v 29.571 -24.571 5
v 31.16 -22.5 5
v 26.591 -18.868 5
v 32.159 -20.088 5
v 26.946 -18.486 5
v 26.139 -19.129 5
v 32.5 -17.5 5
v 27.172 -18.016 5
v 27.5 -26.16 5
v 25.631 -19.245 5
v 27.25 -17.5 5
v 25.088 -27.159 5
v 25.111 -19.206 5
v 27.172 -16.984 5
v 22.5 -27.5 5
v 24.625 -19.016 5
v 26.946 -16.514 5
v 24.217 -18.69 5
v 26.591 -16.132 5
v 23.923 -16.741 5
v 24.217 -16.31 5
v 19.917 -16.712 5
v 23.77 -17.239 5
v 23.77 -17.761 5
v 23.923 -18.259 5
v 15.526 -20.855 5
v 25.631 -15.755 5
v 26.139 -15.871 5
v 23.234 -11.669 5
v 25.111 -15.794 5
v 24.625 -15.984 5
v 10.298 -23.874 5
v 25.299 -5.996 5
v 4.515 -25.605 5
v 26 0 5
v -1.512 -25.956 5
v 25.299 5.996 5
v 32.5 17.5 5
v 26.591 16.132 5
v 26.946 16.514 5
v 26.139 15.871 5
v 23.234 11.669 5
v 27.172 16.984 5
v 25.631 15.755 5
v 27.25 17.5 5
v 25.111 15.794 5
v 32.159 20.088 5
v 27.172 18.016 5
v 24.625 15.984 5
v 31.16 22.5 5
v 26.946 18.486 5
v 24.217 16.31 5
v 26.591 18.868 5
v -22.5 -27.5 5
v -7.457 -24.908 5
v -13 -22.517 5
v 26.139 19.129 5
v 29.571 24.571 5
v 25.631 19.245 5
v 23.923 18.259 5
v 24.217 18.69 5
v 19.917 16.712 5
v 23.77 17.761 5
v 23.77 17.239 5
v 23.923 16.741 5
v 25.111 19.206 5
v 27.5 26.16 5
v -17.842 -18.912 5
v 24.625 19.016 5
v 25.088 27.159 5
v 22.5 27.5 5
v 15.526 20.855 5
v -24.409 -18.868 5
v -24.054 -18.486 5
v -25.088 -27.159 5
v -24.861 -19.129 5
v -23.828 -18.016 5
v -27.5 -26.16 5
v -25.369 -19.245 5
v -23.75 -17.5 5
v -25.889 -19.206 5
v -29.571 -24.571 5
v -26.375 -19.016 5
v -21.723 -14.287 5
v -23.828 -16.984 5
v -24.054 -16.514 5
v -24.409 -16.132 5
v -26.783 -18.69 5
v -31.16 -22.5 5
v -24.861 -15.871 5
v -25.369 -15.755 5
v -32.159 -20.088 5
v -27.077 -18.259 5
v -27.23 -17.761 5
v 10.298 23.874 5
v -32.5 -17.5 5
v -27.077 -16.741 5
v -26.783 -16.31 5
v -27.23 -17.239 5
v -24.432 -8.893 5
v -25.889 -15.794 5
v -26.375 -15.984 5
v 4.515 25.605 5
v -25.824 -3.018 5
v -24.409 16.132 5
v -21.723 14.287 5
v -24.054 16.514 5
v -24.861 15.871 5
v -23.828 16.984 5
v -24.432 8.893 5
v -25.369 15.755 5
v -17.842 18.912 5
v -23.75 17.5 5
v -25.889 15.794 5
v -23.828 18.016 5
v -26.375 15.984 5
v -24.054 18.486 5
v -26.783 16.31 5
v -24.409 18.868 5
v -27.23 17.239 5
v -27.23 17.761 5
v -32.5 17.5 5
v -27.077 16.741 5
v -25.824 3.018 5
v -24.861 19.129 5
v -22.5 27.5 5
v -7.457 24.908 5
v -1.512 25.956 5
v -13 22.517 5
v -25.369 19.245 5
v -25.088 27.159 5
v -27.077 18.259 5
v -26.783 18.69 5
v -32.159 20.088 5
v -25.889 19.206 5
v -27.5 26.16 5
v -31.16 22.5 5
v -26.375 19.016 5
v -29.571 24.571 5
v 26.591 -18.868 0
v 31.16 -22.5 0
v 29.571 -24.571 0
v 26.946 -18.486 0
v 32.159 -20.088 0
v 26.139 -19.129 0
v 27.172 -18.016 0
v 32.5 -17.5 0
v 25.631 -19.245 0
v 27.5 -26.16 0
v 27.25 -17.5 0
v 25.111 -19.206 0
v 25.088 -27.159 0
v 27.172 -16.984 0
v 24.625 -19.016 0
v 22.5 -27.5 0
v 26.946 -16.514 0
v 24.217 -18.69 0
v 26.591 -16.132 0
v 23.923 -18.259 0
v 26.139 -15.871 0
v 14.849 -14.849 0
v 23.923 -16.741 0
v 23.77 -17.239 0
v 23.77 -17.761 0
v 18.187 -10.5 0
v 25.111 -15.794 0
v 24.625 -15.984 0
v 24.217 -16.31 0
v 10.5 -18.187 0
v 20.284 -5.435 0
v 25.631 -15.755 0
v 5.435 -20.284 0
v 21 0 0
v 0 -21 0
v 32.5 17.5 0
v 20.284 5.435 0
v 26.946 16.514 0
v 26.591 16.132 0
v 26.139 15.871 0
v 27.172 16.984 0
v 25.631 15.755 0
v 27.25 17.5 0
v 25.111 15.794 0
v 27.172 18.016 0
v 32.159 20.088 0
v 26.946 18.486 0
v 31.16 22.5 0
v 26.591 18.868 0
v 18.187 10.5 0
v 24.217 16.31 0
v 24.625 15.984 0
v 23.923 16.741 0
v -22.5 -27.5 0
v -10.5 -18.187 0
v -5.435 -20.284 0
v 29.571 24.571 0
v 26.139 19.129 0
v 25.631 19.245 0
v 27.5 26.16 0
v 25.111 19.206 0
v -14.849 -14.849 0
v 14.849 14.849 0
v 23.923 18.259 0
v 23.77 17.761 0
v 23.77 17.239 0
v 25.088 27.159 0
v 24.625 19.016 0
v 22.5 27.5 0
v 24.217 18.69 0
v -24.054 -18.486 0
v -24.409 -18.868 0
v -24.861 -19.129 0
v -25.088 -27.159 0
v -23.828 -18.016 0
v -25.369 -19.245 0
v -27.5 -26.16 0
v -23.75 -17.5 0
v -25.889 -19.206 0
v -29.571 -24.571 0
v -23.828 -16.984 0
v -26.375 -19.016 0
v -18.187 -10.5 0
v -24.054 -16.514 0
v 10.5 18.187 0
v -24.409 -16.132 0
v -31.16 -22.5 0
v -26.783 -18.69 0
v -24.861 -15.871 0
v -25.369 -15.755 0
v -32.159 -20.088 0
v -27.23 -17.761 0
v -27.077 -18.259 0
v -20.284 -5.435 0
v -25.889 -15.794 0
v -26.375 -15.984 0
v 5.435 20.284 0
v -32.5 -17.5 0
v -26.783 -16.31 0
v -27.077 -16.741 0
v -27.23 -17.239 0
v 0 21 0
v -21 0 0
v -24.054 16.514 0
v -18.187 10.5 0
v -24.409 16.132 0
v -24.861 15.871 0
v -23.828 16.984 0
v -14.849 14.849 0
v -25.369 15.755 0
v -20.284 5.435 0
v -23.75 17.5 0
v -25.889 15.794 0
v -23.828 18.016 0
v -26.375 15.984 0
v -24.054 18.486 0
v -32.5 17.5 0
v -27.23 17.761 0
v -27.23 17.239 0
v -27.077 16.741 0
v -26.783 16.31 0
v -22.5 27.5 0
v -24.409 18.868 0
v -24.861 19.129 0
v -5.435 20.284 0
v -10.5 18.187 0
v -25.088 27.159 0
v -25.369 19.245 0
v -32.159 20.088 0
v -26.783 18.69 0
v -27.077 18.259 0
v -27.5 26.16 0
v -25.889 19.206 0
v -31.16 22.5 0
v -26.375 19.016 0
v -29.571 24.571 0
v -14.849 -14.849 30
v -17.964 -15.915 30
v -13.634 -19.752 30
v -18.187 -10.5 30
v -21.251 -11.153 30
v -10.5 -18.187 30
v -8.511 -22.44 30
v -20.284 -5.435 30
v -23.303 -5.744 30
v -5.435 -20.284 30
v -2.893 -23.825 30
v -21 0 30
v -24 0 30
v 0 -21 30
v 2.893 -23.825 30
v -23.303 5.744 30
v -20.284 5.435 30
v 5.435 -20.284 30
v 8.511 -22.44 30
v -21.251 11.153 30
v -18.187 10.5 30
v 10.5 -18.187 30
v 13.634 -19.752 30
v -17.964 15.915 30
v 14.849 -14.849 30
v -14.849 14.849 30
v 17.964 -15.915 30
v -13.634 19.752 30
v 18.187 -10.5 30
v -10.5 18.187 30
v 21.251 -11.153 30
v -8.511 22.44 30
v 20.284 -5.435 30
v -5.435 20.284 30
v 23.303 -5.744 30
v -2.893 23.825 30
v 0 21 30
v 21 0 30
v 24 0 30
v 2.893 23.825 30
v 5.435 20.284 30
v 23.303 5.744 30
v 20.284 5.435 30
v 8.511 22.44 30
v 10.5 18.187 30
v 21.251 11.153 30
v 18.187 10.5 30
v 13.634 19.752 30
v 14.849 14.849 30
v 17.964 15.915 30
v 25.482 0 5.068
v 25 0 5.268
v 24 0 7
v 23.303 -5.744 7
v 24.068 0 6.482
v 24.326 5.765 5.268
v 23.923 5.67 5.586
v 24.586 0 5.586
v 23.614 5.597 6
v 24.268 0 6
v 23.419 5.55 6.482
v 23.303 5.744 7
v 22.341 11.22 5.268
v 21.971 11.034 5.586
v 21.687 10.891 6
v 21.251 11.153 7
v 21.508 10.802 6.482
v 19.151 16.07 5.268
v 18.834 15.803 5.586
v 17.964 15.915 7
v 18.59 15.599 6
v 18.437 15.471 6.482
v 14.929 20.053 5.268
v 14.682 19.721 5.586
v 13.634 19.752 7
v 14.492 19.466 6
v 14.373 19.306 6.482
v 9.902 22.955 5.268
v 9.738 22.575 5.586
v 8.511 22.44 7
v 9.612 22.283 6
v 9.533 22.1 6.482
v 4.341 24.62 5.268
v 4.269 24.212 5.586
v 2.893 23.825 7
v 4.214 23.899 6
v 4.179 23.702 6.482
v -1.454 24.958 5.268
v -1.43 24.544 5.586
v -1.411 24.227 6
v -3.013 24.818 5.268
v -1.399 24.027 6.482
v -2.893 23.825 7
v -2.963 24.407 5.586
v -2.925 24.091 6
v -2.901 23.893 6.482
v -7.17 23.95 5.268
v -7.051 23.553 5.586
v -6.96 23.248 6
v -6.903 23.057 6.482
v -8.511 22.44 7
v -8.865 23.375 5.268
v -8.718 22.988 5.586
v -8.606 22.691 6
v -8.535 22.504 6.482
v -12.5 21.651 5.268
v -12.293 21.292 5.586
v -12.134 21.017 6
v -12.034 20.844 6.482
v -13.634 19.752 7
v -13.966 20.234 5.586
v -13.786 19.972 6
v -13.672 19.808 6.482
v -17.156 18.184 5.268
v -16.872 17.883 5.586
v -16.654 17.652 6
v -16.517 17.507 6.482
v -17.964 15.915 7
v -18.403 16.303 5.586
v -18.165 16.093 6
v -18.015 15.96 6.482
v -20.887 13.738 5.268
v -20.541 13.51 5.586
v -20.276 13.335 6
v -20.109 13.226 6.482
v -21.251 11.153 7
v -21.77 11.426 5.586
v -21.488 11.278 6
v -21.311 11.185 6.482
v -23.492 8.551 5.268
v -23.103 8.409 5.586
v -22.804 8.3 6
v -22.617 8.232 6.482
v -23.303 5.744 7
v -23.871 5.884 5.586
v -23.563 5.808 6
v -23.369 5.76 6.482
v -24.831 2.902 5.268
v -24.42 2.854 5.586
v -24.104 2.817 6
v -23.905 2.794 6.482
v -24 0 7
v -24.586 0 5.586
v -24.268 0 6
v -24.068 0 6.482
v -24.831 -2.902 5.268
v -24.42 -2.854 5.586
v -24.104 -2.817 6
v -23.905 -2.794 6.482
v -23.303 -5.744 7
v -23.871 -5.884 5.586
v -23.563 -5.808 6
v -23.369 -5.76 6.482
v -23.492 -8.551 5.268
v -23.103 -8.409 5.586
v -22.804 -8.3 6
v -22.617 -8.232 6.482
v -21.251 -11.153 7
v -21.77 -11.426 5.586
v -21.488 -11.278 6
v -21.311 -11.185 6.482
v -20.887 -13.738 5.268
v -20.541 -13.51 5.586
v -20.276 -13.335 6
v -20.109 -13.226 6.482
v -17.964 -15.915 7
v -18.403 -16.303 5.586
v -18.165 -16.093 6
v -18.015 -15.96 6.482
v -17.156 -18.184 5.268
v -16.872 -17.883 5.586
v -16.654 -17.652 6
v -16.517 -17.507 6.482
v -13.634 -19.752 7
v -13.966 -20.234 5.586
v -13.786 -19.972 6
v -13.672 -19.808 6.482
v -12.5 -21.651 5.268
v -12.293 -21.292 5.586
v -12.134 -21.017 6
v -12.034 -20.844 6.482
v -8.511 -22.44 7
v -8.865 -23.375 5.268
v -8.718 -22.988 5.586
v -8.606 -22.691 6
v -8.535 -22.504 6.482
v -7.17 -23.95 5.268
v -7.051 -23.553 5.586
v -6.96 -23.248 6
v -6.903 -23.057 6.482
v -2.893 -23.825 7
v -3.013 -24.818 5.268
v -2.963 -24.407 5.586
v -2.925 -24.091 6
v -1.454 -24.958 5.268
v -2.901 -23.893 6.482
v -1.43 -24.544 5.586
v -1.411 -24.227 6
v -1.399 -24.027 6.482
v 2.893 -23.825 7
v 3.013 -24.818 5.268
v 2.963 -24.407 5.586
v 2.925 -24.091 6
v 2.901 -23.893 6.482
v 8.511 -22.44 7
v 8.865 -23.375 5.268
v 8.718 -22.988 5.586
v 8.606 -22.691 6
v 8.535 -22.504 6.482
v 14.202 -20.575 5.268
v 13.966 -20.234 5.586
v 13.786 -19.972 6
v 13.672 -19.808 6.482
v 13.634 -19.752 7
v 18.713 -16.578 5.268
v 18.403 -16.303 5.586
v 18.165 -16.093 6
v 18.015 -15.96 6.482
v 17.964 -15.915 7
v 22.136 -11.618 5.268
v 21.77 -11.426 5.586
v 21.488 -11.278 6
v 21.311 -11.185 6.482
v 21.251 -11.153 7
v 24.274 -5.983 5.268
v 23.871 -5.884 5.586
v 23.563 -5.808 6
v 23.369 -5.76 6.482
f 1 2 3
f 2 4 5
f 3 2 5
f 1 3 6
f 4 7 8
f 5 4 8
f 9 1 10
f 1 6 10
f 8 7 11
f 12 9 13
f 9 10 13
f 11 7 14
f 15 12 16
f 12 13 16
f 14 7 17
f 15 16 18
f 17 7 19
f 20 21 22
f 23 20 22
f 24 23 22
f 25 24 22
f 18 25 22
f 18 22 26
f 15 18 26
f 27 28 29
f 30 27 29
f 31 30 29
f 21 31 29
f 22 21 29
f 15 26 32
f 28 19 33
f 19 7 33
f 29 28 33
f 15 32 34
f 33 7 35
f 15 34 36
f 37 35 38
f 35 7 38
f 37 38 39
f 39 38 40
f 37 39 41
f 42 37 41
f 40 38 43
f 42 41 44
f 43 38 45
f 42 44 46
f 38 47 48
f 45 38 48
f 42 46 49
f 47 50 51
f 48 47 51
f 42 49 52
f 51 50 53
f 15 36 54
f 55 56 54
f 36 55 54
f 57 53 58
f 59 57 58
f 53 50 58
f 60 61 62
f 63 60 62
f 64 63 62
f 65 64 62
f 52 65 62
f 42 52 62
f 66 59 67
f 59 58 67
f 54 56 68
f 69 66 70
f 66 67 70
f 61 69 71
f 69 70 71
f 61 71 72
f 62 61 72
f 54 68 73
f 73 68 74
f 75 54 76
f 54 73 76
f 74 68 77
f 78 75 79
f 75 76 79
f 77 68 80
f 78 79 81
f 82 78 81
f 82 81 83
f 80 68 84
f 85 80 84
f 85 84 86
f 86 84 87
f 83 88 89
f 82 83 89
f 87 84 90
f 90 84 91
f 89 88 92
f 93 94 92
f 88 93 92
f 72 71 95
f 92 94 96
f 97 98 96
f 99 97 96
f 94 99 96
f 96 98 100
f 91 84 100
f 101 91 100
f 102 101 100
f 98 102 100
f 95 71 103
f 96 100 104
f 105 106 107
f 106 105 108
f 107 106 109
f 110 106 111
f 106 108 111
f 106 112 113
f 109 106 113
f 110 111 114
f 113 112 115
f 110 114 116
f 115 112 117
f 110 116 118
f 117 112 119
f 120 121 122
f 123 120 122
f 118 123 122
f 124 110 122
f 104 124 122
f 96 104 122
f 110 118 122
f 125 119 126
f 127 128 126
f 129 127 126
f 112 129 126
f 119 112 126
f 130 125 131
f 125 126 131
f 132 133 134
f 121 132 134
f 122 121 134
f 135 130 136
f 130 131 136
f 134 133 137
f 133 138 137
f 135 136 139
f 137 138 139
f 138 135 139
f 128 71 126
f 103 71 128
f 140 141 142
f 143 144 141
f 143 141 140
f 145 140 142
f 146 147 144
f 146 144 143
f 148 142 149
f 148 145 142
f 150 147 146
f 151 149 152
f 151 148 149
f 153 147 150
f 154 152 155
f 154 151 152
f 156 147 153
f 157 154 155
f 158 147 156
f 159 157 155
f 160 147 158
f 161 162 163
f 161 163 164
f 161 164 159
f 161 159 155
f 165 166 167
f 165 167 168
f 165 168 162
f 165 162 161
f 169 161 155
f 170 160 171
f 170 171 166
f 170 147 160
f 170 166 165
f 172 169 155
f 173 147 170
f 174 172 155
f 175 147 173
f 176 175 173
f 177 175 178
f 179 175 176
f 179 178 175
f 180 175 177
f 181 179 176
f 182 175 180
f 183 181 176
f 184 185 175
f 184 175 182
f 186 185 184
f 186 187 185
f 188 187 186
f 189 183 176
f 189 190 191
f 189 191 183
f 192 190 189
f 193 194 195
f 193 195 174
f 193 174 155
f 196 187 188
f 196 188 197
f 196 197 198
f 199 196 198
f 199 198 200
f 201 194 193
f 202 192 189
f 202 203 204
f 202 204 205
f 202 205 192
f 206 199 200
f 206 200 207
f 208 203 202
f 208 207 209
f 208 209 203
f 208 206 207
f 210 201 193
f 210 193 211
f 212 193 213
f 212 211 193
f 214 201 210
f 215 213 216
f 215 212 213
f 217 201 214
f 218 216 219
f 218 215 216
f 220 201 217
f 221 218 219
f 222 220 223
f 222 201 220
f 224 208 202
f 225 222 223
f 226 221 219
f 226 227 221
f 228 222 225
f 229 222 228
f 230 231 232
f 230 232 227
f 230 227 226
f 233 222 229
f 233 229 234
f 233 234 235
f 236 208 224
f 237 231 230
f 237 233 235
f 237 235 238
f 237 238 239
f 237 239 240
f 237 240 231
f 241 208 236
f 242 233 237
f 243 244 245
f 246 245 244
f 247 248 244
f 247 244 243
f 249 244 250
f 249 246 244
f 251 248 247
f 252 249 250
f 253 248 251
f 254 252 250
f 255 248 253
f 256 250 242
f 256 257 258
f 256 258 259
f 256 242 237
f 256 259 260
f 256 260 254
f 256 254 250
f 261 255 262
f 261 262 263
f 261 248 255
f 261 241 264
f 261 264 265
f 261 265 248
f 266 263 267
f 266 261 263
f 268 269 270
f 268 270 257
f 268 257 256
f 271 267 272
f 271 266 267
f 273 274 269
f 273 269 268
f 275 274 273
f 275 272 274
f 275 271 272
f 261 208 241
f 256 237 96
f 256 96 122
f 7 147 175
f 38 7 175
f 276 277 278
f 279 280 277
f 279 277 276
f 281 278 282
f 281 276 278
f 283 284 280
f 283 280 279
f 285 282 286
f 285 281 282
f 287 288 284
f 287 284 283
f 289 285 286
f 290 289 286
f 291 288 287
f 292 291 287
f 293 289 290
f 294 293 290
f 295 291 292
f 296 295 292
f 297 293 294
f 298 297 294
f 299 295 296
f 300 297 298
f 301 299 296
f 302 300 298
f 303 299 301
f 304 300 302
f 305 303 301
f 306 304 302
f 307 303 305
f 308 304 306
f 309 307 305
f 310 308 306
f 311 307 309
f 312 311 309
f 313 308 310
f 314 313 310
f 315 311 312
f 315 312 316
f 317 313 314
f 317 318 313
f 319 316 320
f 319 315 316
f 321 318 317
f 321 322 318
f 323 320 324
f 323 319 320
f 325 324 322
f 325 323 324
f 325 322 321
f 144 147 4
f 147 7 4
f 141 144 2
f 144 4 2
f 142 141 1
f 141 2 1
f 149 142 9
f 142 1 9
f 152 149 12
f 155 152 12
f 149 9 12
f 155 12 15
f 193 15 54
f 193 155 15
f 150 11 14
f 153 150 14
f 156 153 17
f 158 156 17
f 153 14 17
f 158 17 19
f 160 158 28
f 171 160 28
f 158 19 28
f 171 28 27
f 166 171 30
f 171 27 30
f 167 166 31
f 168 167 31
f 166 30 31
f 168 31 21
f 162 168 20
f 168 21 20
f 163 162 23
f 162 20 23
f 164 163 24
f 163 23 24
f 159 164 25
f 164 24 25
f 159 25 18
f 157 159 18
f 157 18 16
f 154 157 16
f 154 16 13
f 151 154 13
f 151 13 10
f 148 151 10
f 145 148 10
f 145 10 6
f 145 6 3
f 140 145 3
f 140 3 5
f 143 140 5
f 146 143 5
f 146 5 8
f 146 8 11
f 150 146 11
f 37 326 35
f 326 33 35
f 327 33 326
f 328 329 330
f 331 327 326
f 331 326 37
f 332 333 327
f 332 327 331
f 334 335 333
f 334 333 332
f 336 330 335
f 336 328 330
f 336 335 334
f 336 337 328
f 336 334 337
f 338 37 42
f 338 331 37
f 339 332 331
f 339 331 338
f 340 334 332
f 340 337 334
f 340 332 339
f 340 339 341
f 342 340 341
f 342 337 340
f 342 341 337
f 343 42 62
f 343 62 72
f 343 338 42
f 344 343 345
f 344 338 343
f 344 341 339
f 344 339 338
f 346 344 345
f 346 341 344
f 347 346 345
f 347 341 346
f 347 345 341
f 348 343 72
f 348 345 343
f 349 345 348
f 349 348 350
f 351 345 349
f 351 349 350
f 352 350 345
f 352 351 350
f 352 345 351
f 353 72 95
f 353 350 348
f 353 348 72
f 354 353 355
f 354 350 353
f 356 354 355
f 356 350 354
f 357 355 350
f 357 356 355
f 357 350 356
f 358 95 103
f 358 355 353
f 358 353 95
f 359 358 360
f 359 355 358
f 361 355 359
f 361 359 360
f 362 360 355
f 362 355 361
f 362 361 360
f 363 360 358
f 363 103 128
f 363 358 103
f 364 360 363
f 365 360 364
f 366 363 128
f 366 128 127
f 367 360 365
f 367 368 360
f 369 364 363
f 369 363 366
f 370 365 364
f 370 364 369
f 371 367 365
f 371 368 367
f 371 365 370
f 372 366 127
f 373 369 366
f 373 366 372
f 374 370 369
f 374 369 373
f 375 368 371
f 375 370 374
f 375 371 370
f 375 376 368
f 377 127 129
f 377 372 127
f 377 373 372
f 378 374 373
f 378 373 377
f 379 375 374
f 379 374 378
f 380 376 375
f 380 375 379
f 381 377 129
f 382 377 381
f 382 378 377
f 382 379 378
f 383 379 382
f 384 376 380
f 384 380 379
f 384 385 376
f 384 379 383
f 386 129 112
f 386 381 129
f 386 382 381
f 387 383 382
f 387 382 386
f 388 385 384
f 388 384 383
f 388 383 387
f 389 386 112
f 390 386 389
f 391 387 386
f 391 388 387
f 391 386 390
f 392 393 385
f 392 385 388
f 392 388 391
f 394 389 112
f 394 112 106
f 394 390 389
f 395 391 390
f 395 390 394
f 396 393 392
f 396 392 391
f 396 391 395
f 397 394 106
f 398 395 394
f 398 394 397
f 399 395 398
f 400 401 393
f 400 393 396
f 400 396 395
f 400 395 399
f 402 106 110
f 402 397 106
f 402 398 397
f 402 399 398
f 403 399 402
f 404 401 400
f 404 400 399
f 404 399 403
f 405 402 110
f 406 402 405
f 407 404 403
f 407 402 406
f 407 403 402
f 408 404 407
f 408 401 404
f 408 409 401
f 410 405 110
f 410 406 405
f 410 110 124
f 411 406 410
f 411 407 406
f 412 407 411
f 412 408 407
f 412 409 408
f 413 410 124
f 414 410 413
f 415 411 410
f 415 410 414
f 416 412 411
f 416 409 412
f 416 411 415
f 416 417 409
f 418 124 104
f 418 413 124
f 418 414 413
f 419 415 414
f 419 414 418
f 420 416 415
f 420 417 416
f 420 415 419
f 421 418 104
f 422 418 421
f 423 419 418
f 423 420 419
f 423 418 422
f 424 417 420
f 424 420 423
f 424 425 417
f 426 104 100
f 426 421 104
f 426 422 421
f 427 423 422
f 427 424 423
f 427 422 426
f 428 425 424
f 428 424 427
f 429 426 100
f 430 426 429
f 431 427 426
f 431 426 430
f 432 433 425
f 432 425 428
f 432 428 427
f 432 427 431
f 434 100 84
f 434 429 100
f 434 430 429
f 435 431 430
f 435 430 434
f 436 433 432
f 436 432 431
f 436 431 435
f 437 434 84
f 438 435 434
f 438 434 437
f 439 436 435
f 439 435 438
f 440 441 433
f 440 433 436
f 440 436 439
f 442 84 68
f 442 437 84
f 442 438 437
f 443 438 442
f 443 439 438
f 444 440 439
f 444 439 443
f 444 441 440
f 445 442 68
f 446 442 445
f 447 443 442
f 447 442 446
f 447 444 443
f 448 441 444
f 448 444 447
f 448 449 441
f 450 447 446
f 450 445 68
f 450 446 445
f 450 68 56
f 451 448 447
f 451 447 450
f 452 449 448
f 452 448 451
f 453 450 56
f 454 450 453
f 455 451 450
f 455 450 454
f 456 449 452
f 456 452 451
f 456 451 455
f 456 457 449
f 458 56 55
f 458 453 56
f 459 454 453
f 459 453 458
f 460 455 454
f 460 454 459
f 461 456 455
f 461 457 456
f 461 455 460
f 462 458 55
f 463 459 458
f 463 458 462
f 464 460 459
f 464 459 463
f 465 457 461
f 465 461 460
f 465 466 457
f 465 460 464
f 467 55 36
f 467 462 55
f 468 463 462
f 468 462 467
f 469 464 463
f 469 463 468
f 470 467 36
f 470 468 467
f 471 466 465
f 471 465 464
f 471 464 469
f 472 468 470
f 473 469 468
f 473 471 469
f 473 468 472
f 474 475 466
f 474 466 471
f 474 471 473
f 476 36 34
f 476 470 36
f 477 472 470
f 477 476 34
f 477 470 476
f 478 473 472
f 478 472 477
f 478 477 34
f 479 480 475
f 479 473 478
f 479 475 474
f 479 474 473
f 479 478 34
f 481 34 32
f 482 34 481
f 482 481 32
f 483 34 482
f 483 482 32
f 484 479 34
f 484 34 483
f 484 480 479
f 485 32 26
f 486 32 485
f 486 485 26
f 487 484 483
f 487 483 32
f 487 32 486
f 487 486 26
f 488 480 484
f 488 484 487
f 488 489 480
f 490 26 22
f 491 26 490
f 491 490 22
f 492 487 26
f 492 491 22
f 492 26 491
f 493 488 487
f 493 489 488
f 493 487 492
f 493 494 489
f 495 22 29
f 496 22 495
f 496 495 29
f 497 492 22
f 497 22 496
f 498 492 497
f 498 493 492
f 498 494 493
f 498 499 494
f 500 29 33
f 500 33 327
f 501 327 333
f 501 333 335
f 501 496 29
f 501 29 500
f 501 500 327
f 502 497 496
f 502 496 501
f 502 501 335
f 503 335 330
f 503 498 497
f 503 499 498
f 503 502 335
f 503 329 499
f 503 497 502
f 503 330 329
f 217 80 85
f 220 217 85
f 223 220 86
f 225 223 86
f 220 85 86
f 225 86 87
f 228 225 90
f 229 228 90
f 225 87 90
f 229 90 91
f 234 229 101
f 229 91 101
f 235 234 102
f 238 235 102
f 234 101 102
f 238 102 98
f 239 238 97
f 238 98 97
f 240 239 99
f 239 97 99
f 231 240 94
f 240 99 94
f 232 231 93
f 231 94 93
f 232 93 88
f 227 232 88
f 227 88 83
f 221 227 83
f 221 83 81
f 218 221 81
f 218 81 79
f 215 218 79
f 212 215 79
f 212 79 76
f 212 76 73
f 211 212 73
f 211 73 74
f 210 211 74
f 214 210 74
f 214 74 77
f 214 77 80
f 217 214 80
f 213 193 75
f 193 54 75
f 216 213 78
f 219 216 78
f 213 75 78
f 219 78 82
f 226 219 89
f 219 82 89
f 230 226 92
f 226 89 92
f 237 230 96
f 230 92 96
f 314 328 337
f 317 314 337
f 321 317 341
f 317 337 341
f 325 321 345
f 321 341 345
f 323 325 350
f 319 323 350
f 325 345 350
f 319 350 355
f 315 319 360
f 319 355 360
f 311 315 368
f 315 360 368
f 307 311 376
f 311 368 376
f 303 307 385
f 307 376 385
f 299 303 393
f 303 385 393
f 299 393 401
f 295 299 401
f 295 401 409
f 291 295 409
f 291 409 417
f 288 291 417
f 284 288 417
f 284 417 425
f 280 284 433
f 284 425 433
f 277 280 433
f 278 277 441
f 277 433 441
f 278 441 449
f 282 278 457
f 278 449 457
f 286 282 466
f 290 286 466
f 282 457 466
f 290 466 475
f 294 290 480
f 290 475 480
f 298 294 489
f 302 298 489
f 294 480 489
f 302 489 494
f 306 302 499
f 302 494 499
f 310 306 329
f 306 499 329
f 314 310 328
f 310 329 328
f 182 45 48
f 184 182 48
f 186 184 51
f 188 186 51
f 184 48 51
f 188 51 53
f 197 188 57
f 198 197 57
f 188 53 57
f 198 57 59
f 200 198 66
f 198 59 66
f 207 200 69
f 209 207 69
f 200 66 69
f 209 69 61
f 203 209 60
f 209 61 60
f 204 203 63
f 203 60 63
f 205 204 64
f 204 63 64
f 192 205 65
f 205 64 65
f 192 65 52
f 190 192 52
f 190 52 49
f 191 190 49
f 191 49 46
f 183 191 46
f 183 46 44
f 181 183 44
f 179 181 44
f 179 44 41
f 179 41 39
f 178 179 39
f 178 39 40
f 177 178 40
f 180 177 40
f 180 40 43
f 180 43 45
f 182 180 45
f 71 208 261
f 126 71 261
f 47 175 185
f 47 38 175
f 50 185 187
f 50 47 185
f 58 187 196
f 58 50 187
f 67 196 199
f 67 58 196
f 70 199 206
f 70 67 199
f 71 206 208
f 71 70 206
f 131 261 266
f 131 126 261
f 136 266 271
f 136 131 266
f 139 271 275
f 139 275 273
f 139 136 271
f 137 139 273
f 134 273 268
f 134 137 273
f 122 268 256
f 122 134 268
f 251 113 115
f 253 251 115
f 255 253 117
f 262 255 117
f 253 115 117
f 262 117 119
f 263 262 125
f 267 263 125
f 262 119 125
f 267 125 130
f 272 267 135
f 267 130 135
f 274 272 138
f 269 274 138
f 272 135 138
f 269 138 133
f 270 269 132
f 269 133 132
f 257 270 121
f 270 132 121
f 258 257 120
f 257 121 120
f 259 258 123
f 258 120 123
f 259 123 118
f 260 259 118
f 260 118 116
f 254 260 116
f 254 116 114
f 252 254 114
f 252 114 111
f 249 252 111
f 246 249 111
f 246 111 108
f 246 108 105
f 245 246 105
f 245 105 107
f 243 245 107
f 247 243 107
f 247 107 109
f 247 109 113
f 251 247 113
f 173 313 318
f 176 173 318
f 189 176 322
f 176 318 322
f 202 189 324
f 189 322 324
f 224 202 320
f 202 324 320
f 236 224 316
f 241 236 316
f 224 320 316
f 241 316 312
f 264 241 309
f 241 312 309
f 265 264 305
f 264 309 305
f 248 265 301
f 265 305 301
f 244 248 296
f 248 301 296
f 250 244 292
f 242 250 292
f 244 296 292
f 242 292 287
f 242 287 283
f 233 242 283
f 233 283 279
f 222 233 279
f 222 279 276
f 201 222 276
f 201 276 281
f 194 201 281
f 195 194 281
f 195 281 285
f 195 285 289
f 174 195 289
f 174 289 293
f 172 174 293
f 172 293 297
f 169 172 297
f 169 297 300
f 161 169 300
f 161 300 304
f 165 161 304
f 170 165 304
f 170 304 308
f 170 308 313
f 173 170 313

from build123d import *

# Parameters (mm, degrees)
SKETCH_1_R          = 27.5
EXTRUDE_1_DEPTH     = 5
SKETCH_2_R          = 24
EXTRUDE_2_DEPTH     = 25
SKETCH_4_W          = 65
SKETCH_4_H          = 55
EXTRUDE_3_DEPTH     = 5
SKETCH_5_R          = 21
CUT_EXTRUDE_1_DEPTH = 59
FILLET_1_R          = 10
SKETCH_6_R          = 1.75
CUT_EXTRUDE_2_DEPTH = 10
FILLET_2_R          = 2


with BuildPart() as part:
    # 草图1 → 凸台-拉伸1 (new body)
    with BuildSketch(Plane.XY):
        Circle(SKETCH_1_R)
    extrude(amount=EXTRUDE_1_DEPTH)

    # 草图2 → 凸台-拉伸2 (add)
    with BuildSketch(Plane.XY.offset(5)):
        Circle(SKETCH_2_R)
    extrude(amount=EXTRUDE_2_DEPTH)

    # 草图4 → 凸台-拉伸3 (add)
    with BuildSketch(Plane(origin=(0, 0, 0), x_dir=(-1, 0, 0), z_dir=(0, 0, -1))):
        Rectangle(SKETCH_4_W, SKETCH_4_H)
    extrude(amount=-EXTRUDE_3_DEPTH)

    # 草图5 → 切除-拉伸1 (cut)
    with BuildSketch(Plane.XY.offset(30)):
        Circle(SKETCH_5_R)
    extrude(amount=-CUT_EXTRUDE_1_DEPTH, mode=Mode.SUBTRACT)

    # 圆角1
    fillet_1_edges = [part.edges().sort_by_distance(p)[0] for p in [
        (32.5, 27.5, 2.5),
        (-32.5, -27.5, 2.5),
        (32.5, -27.5, 2.5),
        (-32.5, 27.5, 2.5),
    ]]
    fillet(fillet_1_edges, radius=FILLET_1_R)

    # 草图6 → 切除-拉伸2 (cut)
    with BuildSketch(Plane.XY.offset(5)):
        with Locations((-25.5, -17.5)):
            Circle(SKETCH_6_R)
        with Locations((-25.5, 17.5)):
            Circle(SKETCH_6_R)
        with Locations((25.5, 17.5)):
            Circle(SKETCH_6_R)
        with Locations((25.5, -17.5)):
            Circle(SKETCH_6_R)
    extrude(amount=-CUT_EXTRUDE_2_DEPTH, mode=Mode.SUBTRACT)

    # 圆角2
    fillet_2_edges = [part.edges().sort_by_distance(p)[0] for p in [
        (-24, 0, 5),
    ]]
    fillet(fillet_2_edges, radius=FILLET_2_R)


solid = part.part
